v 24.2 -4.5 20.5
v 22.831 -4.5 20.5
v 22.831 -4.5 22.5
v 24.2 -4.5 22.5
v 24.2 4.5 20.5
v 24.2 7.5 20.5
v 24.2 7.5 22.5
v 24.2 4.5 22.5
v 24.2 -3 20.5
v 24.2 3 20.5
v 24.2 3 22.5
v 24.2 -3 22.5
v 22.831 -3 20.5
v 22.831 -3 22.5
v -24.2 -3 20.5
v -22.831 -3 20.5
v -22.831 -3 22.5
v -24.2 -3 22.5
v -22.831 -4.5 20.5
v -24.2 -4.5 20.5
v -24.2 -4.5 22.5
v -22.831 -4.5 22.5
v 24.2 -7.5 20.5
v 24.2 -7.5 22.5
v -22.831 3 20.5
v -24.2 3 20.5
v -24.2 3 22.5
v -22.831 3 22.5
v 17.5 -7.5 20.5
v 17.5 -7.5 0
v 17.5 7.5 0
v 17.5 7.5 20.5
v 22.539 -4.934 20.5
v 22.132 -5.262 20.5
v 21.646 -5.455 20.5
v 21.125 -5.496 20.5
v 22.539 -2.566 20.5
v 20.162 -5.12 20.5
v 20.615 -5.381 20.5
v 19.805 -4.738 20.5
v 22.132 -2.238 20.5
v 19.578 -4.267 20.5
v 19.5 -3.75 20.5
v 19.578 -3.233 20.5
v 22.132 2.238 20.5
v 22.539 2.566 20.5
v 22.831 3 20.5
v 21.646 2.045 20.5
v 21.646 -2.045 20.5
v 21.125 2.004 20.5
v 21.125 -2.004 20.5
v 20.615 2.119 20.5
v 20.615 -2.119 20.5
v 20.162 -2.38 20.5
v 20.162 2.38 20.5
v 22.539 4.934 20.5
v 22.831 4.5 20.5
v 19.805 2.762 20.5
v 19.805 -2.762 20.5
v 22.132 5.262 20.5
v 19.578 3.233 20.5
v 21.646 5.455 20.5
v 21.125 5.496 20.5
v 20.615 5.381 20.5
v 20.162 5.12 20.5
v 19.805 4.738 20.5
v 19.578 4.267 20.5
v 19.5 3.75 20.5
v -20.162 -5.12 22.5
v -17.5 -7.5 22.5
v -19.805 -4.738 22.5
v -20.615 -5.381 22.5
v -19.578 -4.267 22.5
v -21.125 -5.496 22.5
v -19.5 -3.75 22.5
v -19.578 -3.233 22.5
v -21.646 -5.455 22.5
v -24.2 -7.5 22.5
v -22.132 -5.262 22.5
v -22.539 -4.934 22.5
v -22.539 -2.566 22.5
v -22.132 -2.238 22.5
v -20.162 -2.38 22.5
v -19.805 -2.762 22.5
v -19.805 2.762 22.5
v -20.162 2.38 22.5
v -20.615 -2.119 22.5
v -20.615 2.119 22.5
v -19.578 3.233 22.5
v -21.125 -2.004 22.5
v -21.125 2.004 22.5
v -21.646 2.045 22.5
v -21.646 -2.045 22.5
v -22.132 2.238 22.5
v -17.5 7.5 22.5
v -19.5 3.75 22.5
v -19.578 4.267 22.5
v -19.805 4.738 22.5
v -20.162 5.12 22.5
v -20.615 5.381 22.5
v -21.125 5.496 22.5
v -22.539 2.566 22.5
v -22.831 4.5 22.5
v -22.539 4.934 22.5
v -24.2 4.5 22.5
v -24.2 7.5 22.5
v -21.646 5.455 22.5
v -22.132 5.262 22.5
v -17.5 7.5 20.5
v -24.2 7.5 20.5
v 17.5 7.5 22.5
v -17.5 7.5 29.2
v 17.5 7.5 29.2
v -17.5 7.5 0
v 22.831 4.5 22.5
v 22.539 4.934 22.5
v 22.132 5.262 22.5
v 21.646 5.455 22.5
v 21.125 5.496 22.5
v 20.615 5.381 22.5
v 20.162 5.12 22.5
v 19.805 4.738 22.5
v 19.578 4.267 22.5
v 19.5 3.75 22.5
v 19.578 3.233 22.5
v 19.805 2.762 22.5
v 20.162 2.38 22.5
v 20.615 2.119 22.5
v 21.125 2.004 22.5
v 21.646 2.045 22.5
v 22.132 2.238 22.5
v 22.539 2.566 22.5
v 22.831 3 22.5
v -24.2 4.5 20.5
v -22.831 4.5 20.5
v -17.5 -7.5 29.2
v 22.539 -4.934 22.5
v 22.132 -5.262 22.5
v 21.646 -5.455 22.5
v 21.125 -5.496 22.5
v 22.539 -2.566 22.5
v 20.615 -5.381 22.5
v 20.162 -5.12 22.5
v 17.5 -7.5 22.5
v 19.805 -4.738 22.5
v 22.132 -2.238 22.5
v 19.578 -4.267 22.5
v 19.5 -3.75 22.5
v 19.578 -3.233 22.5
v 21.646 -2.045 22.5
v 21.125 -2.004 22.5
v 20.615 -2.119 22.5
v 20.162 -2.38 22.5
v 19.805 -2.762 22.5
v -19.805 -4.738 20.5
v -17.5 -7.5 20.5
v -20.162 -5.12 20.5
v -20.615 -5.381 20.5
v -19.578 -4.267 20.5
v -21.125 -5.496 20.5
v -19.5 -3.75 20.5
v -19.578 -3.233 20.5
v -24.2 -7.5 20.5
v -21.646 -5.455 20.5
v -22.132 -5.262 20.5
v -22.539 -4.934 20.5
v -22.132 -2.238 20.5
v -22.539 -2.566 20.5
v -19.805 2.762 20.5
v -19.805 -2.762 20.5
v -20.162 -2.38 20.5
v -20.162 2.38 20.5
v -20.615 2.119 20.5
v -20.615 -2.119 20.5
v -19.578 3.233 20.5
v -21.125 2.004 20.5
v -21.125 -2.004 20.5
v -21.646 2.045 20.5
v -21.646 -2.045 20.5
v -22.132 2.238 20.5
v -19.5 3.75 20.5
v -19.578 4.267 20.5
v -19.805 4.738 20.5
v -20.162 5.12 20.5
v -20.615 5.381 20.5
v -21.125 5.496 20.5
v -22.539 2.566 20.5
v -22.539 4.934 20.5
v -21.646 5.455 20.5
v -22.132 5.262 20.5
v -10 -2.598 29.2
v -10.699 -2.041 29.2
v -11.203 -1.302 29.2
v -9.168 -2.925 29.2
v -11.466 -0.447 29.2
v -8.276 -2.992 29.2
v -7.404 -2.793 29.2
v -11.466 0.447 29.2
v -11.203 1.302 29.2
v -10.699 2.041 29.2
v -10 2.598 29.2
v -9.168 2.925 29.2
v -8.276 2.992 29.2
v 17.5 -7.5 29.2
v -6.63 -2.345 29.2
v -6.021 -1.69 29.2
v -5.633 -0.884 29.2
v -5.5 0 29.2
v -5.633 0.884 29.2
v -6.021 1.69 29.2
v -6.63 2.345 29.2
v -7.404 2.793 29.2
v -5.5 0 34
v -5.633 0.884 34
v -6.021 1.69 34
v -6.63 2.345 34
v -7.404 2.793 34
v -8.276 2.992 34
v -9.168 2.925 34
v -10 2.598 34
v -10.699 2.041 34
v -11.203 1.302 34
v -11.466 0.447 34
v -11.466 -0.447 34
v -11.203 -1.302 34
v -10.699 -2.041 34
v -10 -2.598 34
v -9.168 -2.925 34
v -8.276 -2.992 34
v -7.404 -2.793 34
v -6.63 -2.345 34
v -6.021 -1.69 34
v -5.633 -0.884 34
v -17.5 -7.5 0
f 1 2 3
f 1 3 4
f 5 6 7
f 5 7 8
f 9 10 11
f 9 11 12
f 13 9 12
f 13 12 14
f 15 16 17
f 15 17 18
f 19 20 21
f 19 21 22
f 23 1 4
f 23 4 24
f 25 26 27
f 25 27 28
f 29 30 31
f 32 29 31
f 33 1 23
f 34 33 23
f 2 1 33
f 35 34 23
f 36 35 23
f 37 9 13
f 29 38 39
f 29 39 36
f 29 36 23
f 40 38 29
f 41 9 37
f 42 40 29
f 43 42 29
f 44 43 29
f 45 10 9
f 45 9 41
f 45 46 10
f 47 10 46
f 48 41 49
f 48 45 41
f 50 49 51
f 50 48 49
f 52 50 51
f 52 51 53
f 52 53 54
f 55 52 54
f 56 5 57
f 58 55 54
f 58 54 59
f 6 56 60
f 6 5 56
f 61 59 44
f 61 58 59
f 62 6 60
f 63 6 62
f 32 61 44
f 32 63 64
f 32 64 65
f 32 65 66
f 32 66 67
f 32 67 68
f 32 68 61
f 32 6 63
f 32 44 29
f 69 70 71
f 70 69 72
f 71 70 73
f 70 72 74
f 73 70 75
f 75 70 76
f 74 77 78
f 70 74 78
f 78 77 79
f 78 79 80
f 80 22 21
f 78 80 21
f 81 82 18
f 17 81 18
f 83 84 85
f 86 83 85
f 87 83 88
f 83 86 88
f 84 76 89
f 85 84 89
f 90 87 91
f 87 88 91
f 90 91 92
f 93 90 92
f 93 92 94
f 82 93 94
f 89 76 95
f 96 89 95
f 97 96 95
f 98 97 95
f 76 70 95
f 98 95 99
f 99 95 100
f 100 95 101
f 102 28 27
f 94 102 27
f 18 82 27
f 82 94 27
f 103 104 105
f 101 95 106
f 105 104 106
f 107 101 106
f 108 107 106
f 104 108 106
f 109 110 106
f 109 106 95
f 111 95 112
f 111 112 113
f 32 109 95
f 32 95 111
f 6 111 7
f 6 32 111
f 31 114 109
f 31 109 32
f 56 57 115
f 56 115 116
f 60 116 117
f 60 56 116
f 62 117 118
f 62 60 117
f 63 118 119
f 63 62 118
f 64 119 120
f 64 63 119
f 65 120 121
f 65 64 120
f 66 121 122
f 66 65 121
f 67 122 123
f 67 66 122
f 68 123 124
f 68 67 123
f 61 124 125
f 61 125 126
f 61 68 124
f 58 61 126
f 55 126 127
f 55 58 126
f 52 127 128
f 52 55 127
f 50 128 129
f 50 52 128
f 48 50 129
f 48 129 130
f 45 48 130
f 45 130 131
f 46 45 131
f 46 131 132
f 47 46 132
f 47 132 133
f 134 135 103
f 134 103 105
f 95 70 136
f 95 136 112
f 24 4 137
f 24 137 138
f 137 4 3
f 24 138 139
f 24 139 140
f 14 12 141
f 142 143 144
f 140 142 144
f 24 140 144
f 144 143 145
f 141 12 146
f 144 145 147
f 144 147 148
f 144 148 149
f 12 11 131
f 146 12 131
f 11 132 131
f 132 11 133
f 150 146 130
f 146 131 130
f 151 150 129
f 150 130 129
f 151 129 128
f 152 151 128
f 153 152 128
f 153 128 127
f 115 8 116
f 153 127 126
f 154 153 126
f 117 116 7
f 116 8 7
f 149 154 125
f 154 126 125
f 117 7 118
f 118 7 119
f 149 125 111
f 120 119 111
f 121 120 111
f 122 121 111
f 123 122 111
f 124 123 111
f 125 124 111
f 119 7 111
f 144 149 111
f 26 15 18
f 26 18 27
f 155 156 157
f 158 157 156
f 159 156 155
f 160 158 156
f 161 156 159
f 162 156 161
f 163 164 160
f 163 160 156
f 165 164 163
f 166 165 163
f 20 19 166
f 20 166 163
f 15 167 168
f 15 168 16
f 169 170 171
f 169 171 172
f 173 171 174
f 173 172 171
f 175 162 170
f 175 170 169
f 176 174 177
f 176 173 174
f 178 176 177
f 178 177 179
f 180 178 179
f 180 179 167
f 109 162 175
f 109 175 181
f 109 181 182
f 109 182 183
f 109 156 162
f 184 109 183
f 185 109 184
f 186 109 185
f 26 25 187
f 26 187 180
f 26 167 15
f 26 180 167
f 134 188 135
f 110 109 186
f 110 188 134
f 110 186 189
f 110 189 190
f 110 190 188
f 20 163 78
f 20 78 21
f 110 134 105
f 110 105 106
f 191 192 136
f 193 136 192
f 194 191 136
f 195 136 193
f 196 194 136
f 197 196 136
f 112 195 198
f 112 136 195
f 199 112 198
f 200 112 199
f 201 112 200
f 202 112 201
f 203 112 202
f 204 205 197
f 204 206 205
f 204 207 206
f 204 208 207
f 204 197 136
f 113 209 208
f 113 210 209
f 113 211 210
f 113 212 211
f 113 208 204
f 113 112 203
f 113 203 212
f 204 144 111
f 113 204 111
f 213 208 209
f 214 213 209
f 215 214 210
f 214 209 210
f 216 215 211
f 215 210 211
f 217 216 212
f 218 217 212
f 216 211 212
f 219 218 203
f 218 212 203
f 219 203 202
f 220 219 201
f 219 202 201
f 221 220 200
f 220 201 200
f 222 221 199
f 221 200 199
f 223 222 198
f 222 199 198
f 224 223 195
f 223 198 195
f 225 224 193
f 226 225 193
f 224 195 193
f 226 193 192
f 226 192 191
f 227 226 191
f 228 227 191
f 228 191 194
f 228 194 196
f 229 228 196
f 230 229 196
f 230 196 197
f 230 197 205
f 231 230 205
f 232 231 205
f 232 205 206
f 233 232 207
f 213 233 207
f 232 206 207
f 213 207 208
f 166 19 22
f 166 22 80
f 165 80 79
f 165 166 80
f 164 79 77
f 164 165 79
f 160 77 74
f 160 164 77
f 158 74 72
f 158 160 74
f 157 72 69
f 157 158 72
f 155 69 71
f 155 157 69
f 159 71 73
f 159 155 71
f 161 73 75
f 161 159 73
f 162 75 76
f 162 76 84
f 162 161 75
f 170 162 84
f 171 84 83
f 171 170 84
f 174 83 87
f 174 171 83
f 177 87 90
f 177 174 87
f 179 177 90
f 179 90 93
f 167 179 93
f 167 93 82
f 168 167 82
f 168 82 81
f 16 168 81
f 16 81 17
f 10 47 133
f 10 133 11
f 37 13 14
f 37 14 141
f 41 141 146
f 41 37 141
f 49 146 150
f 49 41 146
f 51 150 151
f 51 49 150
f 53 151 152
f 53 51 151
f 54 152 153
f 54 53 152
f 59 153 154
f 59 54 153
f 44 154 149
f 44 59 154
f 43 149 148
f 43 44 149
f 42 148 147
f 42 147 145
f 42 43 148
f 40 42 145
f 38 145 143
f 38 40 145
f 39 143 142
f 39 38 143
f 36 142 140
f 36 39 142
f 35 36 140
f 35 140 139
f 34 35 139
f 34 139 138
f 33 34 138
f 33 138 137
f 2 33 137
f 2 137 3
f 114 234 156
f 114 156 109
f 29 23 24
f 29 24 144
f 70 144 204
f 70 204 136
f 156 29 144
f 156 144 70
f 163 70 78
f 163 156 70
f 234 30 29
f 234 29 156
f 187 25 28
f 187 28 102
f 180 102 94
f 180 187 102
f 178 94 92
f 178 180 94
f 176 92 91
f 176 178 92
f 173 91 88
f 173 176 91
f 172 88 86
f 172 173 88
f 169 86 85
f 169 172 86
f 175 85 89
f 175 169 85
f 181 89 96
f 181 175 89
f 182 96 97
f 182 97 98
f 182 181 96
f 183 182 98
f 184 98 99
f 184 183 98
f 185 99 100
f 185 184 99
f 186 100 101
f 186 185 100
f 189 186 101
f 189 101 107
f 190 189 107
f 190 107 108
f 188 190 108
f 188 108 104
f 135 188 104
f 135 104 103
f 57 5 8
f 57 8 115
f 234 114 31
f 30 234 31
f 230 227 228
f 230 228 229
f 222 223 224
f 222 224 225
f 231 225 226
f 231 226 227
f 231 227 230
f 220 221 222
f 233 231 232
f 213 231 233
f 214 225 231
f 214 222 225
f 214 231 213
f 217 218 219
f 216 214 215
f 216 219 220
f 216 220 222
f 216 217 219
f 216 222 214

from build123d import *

# Parameters (mm, degrees)
SZKIC1_W                    = 35
SZKIC1_H                    = 15
DODANIE_WYCI_GNI_CIE1_DEPTH = 20.5
DODANIE_WYCI_GNI_CIE2_DEPTH = 2
SZKIC3_W                    = 35
SZKIC3_H                    = 15
DODANIE_WYCI_GNI_CIE3_DEPTH = 6.7
SZKIC4_R                    = 3
DODANIE_WYCI_GNI_CIE4_DEPTH = 4.8


with BuildPart() as part:
    # Szkic1 → Dodanie-wyciągnięcie1 (new body)
    with BuildSketch(Plane.XY):
        Rectangle(SZKIC1_W, SZKIC1_H)
    extrude(amount=DODANIE_WYCI_GNI_CIE1_DEPTH)

    # Szkic2 → Dodanie-wyciągnięcie2 (add)
    with BuildSketch(Plane.XY.offset(20.5)):
        with BuildLine():
            Line((-24.2, 7.5), (24.2, 7.5))
            Line((24.2, 7.5), (24.2, 4.5))
            Line((24.2, 4.5), (22.83113883, 4.5))
            ThreePointArc((22.83113883, 4.5), (19.5, 3.75), (22.83113883, 3))
            Line((22.83113883, 3), (24.2, 3))
            Line((24.2, 3), (24.2, -3))
            Line((24.2, -3), (22.83113883, -3))
            ThreePointArc((22.83113883, -3), (19.5, -3.75), (22.83113883, -4.5))
            Line((22.83113883, -4.5), (24.2, -4.5))
            Line((24.2, -4.5), (24.2, -7.5))
            Line((24.2, -7.5), (-24.2, -7.5))
            Line((-24.2, -7.5), (-24.2, -4.5))
            Line((-24.2, -4.5), (-22.83113883, -4.5))
            ThreePointArc((-22.83113883, -4.5), (-19.5, -3.75), (-22.83113883, -3))
            Line((-22.83113883, -3), (-24.2, -3))
            Line((-24.2, -3), (-24.2, 3))
            Line((-24.2, 3), (-22.83113883, 3))
            ThreePointArc((-22.83113883, 3), (-19.5, 3.75), (-22.83113883, 4.5))
            Line((-22.83113883, 4.5), (-24.2, 4.5))
            Line((-24.2, 4.5), (-24.2, 7.5))
        make_face()
    extrude(amount=DODANIE_WYCI_GNI_CIE2_DEPTH)

    # Szkic3 → Dodanie-wyciągnięcie3 (add)
    with BuildSketch(Plane.XY.offset(22.5)):
        Rectangle(SZKIC3_W, SZKIC3_H)
    extrude(amount=DODANIE_WYCI_GNI_CIE3_DEPTH)

    # Szkic4 → Dodanie-wyciągnięcie4 (add)
    with BuildSketch(Plane.XY.offset(29.2)):
        with Locations((-8.5, 0)):
            Circle(SZKIC4_R)
    extrude(amount=DODANIE_WYCI_GNI_CIE4_DEPTH)


solid = part.part
